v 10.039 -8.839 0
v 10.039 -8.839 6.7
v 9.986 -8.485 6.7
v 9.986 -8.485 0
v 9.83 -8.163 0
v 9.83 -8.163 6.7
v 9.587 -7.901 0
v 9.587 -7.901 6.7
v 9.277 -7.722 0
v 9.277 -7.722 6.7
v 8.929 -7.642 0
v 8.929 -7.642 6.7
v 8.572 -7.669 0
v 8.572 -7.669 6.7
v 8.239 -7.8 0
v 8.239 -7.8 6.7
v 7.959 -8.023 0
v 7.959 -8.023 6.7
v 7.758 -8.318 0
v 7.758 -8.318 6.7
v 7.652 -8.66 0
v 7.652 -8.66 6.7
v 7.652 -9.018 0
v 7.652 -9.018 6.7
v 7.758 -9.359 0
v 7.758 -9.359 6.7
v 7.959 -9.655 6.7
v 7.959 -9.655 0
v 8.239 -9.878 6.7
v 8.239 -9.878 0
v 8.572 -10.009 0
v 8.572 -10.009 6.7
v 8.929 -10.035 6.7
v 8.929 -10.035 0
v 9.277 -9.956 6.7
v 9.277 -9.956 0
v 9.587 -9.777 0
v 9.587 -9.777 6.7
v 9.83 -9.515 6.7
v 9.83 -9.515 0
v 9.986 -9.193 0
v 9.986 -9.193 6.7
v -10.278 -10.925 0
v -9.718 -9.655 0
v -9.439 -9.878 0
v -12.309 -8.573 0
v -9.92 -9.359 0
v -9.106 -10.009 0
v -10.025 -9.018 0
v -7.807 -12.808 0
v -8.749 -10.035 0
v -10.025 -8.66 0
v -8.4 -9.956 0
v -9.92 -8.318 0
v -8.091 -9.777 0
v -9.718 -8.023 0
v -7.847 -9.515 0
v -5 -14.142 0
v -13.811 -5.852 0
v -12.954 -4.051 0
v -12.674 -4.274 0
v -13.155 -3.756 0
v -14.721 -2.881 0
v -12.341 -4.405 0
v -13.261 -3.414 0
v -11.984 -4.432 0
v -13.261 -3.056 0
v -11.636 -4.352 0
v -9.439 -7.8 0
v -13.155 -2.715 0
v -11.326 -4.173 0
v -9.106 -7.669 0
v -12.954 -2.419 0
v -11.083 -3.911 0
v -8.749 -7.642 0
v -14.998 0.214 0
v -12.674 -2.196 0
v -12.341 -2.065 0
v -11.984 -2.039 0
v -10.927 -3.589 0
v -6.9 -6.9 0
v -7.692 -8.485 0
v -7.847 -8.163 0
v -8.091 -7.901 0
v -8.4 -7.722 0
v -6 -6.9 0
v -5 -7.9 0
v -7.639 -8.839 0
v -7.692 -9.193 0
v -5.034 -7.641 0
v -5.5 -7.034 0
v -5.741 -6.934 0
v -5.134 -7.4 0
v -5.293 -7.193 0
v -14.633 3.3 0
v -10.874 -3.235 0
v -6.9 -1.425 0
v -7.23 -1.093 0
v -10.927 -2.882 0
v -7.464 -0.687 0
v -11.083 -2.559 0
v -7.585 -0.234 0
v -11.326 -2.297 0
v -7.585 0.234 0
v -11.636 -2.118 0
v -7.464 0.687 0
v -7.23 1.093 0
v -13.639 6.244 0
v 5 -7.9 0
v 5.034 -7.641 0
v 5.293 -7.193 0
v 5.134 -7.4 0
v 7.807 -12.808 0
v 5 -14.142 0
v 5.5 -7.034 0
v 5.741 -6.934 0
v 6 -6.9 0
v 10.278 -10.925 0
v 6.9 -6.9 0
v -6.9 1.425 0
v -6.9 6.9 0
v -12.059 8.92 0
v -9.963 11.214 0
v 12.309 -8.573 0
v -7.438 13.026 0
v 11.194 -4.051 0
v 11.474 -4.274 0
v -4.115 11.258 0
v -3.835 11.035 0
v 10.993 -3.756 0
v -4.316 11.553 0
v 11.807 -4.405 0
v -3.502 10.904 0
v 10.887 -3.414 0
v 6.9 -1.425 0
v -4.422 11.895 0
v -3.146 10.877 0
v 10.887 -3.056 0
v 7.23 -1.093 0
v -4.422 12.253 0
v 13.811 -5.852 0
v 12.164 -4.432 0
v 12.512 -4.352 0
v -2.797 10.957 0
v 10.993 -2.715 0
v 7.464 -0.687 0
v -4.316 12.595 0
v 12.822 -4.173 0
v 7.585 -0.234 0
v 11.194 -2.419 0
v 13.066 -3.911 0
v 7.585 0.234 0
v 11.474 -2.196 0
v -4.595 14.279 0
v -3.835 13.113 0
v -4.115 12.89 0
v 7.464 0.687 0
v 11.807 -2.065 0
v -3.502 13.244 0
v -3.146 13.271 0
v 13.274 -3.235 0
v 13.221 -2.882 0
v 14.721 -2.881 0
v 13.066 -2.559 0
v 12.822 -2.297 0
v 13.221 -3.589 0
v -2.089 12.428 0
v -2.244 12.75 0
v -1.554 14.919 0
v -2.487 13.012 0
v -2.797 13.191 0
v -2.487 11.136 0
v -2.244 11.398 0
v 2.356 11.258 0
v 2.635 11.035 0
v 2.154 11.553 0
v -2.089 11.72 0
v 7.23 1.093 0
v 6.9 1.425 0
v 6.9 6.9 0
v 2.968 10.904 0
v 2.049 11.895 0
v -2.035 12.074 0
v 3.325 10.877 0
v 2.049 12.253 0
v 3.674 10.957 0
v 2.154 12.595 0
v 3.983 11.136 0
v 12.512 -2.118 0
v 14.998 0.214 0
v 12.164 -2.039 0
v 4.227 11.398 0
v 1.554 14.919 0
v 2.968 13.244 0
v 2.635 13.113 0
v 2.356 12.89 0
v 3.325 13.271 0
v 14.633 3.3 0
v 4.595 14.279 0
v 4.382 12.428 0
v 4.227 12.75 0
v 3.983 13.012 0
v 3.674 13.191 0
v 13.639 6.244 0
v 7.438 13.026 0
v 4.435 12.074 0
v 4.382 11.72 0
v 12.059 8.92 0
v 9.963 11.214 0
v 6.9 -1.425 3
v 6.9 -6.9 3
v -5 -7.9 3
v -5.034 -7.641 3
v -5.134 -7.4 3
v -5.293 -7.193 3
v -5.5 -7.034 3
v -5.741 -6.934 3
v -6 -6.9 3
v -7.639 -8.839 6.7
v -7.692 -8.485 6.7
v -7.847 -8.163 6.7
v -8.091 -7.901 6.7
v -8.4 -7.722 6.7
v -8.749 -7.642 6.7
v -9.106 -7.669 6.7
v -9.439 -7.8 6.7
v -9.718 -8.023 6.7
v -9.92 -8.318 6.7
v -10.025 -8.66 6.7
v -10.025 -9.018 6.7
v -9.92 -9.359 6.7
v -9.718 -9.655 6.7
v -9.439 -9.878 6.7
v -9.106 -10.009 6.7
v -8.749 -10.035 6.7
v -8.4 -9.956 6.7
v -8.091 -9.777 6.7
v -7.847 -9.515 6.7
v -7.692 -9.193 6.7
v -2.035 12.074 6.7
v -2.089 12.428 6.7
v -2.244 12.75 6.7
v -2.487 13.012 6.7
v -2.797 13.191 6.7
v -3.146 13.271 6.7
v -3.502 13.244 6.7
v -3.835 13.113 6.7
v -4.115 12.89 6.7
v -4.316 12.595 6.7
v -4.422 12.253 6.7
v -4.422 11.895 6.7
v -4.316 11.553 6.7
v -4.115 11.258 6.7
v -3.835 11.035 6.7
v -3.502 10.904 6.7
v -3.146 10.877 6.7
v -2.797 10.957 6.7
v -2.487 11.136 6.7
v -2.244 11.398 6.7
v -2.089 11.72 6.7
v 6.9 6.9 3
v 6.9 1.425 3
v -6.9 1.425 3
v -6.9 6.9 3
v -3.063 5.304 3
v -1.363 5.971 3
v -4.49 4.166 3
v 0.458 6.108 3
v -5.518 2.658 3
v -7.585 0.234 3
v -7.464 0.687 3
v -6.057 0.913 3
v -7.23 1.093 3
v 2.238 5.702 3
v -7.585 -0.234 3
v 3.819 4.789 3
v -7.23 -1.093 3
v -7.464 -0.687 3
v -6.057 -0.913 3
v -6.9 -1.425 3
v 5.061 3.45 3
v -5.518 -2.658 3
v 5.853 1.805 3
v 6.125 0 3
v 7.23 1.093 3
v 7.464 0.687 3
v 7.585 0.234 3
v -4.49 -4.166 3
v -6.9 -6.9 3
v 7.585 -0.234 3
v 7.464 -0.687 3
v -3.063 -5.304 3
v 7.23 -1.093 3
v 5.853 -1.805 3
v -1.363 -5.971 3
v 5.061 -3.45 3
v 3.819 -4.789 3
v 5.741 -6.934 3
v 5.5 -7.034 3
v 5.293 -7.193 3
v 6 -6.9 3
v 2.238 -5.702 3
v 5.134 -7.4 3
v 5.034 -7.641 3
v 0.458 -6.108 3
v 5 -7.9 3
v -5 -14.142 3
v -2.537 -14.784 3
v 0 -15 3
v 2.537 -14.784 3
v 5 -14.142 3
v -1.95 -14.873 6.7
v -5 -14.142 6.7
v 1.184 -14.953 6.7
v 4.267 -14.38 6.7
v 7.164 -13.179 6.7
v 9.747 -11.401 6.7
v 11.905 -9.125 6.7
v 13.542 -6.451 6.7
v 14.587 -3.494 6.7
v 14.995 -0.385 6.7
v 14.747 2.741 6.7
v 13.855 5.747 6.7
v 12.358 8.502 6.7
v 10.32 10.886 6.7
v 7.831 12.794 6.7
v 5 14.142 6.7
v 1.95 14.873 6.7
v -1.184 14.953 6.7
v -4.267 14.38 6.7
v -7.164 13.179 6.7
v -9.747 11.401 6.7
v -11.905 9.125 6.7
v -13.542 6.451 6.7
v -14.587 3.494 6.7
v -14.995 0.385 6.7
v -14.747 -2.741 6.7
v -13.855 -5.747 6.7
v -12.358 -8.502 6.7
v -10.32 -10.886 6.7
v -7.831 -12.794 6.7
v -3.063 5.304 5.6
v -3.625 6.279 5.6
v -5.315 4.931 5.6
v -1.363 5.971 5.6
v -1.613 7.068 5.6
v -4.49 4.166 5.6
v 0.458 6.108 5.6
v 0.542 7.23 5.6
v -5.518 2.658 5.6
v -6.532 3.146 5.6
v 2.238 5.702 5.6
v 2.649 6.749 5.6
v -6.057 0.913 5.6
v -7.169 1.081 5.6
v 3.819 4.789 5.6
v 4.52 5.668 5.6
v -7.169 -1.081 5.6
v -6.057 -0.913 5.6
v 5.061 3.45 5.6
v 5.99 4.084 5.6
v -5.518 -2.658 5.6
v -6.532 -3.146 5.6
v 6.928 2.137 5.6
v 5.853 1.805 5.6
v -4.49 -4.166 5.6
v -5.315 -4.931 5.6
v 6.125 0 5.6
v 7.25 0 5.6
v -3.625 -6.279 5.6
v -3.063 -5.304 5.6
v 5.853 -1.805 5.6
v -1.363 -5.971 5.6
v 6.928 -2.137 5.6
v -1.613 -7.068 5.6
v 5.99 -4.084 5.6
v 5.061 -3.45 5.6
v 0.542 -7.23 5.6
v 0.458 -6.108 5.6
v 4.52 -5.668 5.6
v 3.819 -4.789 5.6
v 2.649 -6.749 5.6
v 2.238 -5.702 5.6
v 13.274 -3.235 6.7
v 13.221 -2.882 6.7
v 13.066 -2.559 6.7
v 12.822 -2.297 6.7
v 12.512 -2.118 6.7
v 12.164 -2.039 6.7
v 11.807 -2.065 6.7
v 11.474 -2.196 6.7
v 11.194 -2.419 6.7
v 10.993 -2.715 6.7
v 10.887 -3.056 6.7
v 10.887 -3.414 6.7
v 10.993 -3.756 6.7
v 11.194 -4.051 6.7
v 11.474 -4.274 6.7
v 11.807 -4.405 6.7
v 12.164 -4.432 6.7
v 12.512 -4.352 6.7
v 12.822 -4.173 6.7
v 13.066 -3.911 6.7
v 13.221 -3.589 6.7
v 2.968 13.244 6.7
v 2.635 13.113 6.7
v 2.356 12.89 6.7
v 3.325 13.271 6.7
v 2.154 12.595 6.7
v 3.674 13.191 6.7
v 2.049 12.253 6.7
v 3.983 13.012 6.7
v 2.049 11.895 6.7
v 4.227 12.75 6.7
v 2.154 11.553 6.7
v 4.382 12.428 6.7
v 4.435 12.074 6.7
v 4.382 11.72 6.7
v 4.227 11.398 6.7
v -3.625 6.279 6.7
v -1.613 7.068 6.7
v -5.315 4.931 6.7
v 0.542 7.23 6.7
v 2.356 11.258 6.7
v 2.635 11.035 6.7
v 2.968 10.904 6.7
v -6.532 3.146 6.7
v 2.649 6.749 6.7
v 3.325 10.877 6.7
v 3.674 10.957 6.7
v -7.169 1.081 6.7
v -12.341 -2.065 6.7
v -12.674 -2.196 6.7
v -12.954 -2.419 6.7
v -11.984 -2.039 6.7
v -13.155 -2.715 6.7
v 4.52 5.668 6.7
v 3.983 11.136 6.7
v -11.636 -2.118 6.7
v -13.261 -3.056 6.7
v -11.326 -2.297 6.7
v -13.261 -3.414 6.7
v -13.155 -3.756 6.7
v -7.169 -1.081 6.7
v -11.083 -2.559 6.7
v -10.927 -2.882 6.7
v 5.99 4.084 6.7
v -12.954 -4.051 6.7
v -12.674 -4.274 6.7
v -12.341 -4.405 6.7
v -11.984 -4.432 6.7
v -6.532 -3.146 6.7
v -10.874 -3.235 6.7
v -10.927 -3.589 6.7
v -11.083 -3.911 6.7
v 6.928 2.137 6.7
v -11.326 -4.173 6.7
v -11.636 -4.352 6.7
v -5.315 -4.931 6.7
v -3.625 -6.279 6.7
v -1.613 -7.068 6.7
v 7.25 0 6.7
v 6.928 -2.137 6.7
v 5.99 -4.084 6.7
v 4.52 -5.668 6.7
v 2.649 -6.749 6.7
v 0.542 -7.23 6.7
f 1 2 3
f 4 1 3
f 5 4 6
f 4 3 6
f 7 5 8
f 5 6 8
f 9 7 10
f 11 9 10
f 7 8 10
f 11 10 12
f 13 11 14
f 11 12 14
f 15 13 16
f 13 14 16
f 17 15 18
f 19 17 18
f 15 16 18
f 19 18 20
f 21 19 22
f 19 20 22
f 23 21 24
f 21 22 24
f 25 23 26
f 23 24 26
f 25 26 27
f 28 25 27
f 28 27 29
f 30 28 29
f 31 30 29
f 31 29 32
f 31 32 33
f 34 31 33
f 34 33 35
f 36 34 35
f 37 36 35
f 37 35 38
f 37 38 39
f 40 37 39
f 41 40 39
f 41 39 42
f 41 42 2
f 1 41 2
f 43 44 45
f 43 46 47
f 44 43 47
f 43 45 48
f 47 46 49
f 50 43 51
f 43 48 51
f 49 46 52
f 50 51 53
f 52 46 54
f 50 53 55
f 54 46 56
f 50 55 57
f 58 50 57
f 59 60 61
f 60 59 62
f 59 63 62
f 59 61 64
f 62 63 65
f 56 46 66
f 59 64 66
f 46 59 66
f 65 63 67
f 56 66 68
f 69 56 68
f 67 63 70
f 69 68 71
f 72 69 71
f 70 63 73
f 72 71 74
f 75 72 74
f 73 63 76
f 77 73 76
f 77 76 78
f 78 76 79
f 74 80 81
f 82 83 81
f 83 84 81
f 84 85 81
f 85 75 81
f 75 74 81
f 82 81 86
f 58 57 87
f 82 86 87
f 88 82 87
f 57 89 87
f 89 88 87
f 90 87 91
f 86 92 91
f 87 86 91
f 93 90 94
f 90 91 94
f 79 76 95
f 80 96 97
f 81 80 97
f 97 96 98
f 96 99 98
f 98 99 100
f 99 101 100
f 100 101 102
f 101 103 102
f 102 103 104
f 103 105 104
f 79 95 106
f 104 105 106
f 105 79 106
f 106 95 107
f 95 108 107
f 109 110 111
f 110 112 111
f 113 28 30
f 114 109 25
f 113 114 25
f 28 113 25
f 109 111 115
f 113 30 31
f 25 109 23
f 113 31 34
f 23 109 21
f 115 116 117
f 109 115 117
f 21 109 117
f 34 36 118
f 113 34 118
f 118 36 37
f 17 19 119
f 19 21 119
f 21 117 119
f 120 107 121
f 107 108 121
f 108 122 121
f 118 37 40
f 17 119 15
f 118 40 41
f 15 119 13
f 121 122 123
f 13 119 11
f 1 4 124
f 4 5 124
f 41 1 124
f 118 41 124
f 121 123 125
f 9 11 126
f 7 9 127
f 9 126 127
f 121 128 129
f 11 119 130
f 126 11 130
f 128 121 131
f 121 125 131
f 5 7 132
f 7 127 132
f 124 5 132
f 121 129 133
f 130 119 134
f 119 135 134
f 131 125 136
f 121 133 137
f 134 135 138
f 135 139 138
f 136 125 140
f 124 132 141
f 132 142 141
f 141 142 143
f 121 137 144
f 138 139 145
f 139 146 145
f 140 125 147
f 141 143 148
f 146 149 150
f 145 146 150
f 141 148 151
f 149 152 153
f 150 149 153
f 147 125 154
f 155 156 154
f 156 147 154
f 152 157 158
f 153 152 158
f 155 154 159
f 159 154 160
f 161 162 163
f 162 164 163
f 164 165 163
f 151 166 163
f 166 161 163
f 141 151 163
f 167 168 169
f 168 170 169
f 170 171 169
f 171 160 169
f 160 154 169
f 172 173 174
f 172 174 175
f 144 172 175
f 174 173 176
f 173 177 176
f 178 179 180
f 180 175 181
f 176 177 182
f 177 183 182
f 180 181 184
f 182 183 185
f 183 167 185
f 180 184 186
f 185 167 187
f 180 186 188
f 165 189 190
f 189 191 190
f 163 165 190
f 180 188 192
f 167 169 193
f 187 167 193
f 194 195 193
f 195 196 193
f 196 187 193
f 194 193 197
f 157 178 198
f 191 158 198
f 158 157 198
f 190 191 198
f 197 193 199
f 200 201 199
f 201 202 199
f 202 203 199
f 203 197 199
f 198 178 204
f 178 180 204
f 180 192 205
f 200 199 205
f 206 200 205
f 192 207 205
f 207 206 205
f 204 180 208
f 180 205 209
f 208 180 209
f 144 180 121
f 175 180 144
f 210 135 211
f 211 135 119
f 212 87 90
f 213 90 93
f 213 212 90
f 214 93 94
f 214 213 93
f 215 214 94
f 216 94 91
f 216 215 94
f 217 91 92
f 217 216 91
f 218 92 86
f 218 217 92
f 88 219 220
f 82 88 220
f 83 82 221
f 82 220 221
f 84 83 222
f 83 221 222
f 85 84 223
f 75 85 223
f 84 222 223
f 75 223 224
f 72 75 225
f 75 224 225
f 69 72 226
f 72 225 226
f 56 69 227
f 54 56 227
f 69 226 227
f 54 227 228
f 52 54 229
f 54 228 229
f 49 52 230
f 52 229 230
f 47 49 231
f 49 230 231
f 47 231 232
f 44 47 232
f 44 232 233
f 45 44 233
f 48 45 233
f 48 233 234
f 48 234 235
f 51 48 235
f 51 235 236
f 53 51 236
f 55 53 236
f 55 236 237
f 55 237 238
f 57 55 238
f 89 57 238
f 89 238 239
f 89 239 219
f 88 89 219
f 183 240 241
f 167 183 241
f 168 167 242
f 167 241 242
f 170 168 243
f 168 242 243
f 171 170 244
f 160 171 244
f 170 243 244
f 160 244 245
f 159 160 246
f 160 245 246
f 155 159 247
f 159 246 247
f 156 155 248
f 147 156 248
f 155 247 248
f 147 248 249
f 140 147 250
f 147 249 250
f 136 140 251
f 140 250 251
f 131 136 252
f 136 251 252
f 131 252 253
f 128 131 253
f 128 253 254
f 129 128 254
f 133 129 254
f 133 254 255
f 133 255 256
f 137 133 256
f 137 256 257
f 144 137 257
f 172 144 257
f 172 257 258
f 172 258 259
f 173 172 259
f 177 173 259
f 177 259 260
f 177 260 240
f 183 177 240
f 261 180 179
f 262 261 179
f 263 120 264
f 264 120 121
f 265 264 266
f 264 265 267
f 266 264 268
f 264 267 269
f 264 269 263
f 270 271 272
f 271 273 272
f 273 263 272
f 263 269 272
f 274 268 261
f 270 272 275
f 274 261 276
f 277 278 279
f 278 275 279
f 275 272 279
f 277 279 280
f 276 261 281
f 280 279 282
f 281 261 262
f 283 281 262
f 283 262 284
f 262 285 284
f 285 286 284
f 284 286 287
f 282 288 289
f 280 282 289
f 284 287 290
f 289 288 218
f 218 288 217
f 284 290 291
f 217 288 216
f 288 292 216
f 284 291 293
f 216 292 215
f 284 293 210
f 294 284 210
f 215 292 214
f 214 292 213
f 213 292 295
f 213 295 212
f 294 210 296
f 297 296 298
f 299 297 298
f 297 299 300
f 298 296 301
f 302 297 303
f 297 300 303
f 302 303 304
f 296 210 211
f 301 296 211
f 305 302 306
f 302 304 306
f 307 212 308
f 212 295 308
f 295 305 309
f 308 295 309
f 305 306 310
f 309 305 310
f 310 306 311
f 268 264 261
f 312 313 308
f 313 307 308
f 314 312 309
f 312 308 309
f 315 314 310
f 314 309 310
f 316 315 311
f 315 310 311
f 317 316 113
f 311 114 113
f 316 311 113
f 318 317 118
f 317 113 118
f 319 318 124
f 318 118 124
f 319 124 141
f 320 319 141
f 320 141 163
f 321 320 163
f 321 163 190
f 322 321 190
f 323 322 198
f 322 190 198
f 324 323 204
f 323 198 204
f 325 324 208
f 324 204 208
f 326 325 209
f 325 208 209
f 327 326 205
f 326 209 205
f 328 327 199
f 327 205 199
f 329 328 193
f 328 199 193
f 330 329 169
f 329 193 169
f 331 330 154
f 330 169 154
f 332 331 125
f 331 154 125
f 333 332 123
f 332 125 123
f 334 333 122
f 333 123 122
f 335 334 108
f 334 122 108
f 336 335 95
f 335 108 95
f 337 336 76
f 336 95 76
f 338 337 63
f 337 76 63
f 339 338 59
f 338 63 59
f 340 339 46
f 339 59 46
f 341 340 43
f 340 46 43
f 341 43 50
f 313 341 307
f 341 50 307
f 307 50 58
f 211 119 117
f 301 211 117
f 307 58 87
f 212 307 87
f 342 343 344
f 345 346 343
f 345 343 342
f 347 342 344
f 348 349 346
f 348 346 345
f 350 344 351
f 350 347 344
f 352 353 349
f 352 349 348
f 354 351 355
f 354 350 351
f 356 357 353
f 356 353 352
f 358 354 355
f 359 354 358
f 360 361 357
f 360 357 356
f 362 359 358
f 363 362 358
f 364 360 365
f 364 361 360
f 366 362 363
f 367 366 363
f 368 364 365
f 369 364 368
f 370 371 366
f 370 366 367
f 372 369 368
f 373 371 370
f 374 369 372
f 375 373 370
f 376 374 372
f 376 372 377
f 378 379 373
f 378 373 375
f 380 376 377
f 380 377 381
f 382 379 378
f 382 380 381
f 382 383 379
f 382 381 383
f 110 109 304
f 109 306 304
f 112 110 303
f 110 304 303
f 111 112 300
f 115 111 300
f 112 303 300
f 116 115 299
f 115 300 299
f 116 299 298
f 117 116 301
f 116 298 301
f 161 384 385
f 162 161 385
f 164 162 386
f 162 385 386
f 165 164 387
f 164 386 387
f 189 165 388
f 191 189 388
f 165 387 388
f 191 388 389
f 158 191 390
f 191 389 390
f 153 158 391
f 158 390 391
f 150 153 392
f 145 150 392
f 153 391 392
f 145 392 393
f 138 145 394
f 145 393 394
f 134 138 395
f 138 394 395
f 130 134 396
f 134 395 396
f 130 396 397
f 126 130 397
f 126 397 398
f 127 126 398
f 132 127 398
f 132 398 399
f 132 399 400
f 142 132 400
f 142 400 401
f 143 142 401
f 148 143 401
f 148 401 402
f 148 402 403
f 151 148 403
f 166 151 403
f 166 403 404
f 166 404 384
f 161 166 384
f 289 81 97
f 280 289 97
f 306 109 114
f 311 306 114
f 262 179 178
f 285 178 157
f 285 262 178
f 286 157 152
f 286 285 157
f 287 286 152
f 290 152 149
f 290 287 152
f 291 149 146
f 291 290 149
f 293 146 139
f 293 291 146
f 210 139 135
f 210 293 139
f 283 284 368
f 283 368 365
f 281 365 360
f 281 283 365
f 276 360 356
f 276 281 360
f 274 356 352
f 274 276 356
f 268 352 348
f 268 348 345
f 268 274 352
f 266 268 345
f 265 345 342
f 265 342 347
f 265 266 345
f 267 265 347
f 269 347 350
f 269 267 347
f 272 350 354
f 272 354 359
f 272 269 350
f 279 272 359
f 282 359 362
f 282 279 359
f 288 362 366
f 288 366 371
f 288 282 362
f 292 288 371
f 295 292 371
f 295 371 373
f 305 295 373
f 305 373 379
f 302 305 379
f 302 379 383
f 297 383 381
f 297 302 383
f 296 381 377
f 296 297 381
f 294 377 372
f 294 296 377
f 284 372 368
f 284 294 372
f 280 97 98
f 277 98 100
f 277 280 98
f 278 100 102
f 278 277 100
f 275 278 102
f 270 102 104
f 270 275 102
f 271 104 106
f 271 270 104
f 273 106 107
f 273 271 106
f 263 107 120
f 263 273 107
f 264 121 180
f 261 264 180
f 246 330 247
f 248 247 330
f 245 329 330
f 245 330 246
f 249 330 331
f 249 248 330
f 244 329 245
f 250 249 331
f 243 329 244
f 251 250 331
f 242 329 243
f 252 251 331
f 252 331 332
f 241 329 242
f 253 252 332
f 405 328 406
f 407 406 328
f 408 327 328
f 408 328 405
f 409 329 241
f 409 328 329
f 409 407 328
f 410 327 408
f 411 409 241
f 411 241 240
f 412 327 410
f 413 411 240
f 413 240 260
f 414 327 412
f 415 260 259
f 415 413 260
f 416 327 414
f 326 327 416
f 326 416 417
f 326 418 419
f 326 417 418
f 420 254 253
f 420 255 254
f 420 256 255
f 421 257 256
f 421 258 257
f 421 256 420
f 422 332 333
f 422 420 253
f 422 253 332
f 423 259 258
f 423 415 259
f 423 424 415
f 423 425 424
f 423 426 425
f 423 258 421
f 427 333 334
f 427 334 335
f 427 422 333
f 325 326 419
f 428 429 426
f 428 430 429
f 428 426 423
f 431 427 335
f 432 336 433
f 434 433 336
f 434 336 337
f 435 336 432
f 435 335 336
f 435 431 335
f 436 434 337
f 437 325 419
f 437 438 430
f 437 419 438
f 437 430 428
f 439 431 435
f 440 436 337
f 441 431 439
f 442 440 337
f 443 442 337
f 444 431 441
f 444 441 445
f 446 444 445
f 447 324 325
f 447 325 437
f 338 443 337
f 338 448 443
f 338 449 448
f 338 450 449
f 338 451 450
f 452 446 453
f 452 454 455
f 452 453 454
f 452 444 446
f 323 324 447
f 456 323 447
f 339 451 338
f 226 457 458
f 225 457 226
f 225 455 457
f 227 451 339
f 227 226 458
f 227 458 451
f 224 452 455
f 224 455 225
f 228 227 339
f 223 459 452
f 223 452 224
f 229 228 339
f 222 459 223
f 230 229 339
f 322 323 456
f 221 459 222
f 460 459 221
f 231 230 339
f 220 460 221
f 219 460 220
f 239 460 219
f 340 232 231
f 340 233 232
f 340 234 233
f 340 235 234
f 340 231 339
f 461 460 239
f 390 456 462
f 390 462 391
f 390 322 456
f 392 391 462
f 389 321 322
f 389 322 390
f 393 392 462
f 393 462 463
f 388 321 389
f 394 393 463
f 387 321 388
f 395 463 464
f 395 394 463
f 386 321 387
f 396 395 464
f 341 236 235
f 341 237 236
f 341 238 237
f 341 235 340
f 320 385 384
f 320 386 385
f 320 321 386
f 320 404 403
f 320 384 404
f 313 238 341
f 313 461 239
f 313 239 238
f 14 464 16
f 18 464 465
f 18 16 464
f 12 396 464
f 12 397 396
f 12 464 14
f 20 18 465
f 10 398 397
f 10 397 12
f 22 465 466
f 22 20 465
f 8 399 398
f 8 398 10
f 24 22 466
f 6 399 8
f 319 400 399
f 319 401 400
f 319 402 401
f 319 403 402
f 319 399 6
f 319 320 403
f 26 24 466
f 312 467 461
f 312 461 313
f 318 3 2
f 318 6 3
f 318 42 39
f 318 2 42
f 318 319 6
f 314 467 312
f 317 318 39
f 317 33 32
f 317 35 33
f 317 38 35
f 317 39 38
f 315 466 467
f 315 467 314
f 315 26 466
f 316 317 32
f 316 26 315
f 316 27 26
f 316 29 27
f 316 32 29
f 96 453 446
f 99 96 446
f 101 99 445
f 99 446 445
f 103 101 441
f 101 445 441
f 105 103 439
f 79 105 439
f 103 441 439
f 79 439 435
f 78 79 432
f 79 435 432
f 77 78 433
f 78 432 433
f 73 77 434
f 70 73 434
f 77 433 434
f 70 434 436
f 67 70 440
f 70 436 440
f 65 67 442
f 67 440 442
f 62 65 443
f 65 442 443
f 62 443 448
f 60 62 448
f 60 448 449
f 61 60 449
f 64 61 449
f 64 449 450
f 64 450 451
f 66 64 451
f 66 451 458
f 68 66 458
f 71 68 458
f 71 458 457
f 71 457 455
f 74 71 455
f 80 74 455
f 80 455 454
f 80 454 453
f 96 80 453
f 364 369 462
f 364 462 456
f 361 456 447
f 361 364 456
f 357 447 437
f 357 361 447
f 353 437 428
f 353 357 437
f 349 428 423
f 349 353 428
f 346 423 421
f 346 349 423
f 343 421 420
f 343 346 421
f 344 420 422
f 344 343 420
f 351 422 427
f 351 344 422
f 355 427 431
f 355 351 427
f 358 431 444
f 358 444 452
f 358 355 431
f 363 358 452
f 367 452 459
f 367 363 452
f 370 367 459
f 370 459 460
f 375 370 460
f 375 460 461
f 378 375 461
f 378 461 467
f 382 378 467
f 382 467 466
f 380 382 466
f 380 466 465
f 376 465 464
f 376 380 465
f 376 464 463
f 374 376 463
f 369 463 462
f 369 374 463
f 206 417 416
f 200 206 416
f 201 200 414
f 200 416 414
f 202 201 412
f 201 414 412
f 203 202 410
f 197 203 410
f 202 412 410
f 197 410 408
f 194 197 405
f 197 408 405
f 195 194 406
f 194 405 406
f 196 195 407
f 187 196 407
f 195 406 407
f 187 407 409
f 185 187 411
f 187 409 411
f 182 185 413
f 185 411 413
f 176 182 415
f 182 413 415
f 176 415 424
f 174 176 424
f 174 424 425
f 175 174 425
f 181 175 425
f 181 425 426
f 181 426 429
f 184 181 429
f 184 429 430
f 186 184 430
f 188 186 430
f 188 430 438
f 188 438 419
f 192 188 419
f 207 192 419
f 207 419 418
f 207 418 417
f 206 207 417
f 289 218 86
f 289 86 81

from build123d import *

# Parameters (mm, degrees)
EXTRUDE_1_DEPTH     = 3
CUT_EXTRUDE_4_DEPTH = 22.424285286
SKETCH_12_R         = 15
SKETCH_12_R_2       = 6.125
EXTRUDE_2_DEPTH     = 2.6
SKETCH_13_R         = 15
SKETCH_13_R_2       = 7.25
EXTRUDE_3_DEPTH     = 1.1
SKETCH_14_R         = 1.2
CUT_EXTRUDE_5_DEPTH = 23.246123258
FILLET_1_R          = 1


with BuildPart() as part:
    # 스케치1 → 보스-돌출1 (new body)
    with BuildSketch(Plane.XY):
        with BuildLine():
            Line((-5, -6.9), (-6.9, -6.9))
            Line((-6.9, -6.9), (-6.9, 6.9))
            Line((-6.9, 6.9), (6.9, 6.9))
            Line((6.9, 6.9), (6.9, -6.9))
            Line((6.9, -6.9), (5, -6.9))
            Line((5, -6.9), (5, -14.142135624))
            ThreePointArc((5, -14.142135624), (0, 15), (-5, -14.142135624))
            Line((-5, -14.142135624), (-5, -6.9))
        make_face()
    extrude(amount=EXTRUDE_1_DEPTH)

    # 스케치11 → 컷-돌출4 (cut, through all)
    with BuildSketch(Plane.XY.offset(3)):
        with BuildLine():
            Line((5.8, -1.8), (-5.8, -1.8))
            ThreePointArc((-5.8, -1.8), (-7.6, 0), (-5.8, 1.8))
            Line((-5.8, 1.8), (5.8, 1.8))
            ThreePointArc((5.8, 1.8), (7.6, 0), (5.8, -1.8))
        make_face()
    extrude(amount=-CUT_EXTRUDE_4_DEPTH, mode=Mode.SUBTRACT)

    # 스케치12 → 보스-돌출2 (add)
    with BuildSketch(Plane.XY.offset(3)):
        with Locations(Location((0, 0, 0), (0, 0, 250.528779366))):
            Circle(SKETCH_12_R)
        Circle(SKETCH_12_R_2, mode=Mode.SUBTRACT)
    extrude(amount=EXTRUDE_2_DEPTH)

    # 스케치13 → 보스-돌출3 (add)
    with BuildSketch(Plane.XY.offset(5.6)):
        with Locations(Location((0, 0, 0), (0, 0, 250.528779366))):
            Circle(SKETCH_13_R)
        Circle(SKETCH_13_R_2, mode=Mode.SUBTRACT)
    extrude(amount=EXTRUDE_3_DEPTH)

    # 스케치14 → 컷-돌출5 (cut, through all)
    with BuildSketch(Plane.XY.offset(6.7)):
        with Locations((3.235238064, 12.074072829)):
            Circle(SKETCH_14_R)
        with Locations((-3.235238064, 12.074072829)):
            Circle(SKETCH_14_R)
        with Locations((12.074072829, -3.235238064)):
            Circle(SKETCH_14_R)
        with Locations((8.838834765, -8.838834765)):
            Circle(SKETCH_14_R)
        with Locations((-8.838834765, -8.838834765)):
            Circle(SKETCH_14_R)
        with Locations((-12.074072829, -3.235238064)):
            Circle(SKETCH_14_R)
    extrude(amount=-CUT_EXTRUDE_5_DEPTH, mode=Mode.SUBTRACT)

    # 필렛1
    fillet_1_edges = [part.edges().sort_by_distance(p)[0] for p in [
        (-5, -6.9, 1.5),
        (5, -6.9, 1.5),
    ]]
    fillet(fillet_1_edges, radius=FILLET_1_R)


solid = part.part
